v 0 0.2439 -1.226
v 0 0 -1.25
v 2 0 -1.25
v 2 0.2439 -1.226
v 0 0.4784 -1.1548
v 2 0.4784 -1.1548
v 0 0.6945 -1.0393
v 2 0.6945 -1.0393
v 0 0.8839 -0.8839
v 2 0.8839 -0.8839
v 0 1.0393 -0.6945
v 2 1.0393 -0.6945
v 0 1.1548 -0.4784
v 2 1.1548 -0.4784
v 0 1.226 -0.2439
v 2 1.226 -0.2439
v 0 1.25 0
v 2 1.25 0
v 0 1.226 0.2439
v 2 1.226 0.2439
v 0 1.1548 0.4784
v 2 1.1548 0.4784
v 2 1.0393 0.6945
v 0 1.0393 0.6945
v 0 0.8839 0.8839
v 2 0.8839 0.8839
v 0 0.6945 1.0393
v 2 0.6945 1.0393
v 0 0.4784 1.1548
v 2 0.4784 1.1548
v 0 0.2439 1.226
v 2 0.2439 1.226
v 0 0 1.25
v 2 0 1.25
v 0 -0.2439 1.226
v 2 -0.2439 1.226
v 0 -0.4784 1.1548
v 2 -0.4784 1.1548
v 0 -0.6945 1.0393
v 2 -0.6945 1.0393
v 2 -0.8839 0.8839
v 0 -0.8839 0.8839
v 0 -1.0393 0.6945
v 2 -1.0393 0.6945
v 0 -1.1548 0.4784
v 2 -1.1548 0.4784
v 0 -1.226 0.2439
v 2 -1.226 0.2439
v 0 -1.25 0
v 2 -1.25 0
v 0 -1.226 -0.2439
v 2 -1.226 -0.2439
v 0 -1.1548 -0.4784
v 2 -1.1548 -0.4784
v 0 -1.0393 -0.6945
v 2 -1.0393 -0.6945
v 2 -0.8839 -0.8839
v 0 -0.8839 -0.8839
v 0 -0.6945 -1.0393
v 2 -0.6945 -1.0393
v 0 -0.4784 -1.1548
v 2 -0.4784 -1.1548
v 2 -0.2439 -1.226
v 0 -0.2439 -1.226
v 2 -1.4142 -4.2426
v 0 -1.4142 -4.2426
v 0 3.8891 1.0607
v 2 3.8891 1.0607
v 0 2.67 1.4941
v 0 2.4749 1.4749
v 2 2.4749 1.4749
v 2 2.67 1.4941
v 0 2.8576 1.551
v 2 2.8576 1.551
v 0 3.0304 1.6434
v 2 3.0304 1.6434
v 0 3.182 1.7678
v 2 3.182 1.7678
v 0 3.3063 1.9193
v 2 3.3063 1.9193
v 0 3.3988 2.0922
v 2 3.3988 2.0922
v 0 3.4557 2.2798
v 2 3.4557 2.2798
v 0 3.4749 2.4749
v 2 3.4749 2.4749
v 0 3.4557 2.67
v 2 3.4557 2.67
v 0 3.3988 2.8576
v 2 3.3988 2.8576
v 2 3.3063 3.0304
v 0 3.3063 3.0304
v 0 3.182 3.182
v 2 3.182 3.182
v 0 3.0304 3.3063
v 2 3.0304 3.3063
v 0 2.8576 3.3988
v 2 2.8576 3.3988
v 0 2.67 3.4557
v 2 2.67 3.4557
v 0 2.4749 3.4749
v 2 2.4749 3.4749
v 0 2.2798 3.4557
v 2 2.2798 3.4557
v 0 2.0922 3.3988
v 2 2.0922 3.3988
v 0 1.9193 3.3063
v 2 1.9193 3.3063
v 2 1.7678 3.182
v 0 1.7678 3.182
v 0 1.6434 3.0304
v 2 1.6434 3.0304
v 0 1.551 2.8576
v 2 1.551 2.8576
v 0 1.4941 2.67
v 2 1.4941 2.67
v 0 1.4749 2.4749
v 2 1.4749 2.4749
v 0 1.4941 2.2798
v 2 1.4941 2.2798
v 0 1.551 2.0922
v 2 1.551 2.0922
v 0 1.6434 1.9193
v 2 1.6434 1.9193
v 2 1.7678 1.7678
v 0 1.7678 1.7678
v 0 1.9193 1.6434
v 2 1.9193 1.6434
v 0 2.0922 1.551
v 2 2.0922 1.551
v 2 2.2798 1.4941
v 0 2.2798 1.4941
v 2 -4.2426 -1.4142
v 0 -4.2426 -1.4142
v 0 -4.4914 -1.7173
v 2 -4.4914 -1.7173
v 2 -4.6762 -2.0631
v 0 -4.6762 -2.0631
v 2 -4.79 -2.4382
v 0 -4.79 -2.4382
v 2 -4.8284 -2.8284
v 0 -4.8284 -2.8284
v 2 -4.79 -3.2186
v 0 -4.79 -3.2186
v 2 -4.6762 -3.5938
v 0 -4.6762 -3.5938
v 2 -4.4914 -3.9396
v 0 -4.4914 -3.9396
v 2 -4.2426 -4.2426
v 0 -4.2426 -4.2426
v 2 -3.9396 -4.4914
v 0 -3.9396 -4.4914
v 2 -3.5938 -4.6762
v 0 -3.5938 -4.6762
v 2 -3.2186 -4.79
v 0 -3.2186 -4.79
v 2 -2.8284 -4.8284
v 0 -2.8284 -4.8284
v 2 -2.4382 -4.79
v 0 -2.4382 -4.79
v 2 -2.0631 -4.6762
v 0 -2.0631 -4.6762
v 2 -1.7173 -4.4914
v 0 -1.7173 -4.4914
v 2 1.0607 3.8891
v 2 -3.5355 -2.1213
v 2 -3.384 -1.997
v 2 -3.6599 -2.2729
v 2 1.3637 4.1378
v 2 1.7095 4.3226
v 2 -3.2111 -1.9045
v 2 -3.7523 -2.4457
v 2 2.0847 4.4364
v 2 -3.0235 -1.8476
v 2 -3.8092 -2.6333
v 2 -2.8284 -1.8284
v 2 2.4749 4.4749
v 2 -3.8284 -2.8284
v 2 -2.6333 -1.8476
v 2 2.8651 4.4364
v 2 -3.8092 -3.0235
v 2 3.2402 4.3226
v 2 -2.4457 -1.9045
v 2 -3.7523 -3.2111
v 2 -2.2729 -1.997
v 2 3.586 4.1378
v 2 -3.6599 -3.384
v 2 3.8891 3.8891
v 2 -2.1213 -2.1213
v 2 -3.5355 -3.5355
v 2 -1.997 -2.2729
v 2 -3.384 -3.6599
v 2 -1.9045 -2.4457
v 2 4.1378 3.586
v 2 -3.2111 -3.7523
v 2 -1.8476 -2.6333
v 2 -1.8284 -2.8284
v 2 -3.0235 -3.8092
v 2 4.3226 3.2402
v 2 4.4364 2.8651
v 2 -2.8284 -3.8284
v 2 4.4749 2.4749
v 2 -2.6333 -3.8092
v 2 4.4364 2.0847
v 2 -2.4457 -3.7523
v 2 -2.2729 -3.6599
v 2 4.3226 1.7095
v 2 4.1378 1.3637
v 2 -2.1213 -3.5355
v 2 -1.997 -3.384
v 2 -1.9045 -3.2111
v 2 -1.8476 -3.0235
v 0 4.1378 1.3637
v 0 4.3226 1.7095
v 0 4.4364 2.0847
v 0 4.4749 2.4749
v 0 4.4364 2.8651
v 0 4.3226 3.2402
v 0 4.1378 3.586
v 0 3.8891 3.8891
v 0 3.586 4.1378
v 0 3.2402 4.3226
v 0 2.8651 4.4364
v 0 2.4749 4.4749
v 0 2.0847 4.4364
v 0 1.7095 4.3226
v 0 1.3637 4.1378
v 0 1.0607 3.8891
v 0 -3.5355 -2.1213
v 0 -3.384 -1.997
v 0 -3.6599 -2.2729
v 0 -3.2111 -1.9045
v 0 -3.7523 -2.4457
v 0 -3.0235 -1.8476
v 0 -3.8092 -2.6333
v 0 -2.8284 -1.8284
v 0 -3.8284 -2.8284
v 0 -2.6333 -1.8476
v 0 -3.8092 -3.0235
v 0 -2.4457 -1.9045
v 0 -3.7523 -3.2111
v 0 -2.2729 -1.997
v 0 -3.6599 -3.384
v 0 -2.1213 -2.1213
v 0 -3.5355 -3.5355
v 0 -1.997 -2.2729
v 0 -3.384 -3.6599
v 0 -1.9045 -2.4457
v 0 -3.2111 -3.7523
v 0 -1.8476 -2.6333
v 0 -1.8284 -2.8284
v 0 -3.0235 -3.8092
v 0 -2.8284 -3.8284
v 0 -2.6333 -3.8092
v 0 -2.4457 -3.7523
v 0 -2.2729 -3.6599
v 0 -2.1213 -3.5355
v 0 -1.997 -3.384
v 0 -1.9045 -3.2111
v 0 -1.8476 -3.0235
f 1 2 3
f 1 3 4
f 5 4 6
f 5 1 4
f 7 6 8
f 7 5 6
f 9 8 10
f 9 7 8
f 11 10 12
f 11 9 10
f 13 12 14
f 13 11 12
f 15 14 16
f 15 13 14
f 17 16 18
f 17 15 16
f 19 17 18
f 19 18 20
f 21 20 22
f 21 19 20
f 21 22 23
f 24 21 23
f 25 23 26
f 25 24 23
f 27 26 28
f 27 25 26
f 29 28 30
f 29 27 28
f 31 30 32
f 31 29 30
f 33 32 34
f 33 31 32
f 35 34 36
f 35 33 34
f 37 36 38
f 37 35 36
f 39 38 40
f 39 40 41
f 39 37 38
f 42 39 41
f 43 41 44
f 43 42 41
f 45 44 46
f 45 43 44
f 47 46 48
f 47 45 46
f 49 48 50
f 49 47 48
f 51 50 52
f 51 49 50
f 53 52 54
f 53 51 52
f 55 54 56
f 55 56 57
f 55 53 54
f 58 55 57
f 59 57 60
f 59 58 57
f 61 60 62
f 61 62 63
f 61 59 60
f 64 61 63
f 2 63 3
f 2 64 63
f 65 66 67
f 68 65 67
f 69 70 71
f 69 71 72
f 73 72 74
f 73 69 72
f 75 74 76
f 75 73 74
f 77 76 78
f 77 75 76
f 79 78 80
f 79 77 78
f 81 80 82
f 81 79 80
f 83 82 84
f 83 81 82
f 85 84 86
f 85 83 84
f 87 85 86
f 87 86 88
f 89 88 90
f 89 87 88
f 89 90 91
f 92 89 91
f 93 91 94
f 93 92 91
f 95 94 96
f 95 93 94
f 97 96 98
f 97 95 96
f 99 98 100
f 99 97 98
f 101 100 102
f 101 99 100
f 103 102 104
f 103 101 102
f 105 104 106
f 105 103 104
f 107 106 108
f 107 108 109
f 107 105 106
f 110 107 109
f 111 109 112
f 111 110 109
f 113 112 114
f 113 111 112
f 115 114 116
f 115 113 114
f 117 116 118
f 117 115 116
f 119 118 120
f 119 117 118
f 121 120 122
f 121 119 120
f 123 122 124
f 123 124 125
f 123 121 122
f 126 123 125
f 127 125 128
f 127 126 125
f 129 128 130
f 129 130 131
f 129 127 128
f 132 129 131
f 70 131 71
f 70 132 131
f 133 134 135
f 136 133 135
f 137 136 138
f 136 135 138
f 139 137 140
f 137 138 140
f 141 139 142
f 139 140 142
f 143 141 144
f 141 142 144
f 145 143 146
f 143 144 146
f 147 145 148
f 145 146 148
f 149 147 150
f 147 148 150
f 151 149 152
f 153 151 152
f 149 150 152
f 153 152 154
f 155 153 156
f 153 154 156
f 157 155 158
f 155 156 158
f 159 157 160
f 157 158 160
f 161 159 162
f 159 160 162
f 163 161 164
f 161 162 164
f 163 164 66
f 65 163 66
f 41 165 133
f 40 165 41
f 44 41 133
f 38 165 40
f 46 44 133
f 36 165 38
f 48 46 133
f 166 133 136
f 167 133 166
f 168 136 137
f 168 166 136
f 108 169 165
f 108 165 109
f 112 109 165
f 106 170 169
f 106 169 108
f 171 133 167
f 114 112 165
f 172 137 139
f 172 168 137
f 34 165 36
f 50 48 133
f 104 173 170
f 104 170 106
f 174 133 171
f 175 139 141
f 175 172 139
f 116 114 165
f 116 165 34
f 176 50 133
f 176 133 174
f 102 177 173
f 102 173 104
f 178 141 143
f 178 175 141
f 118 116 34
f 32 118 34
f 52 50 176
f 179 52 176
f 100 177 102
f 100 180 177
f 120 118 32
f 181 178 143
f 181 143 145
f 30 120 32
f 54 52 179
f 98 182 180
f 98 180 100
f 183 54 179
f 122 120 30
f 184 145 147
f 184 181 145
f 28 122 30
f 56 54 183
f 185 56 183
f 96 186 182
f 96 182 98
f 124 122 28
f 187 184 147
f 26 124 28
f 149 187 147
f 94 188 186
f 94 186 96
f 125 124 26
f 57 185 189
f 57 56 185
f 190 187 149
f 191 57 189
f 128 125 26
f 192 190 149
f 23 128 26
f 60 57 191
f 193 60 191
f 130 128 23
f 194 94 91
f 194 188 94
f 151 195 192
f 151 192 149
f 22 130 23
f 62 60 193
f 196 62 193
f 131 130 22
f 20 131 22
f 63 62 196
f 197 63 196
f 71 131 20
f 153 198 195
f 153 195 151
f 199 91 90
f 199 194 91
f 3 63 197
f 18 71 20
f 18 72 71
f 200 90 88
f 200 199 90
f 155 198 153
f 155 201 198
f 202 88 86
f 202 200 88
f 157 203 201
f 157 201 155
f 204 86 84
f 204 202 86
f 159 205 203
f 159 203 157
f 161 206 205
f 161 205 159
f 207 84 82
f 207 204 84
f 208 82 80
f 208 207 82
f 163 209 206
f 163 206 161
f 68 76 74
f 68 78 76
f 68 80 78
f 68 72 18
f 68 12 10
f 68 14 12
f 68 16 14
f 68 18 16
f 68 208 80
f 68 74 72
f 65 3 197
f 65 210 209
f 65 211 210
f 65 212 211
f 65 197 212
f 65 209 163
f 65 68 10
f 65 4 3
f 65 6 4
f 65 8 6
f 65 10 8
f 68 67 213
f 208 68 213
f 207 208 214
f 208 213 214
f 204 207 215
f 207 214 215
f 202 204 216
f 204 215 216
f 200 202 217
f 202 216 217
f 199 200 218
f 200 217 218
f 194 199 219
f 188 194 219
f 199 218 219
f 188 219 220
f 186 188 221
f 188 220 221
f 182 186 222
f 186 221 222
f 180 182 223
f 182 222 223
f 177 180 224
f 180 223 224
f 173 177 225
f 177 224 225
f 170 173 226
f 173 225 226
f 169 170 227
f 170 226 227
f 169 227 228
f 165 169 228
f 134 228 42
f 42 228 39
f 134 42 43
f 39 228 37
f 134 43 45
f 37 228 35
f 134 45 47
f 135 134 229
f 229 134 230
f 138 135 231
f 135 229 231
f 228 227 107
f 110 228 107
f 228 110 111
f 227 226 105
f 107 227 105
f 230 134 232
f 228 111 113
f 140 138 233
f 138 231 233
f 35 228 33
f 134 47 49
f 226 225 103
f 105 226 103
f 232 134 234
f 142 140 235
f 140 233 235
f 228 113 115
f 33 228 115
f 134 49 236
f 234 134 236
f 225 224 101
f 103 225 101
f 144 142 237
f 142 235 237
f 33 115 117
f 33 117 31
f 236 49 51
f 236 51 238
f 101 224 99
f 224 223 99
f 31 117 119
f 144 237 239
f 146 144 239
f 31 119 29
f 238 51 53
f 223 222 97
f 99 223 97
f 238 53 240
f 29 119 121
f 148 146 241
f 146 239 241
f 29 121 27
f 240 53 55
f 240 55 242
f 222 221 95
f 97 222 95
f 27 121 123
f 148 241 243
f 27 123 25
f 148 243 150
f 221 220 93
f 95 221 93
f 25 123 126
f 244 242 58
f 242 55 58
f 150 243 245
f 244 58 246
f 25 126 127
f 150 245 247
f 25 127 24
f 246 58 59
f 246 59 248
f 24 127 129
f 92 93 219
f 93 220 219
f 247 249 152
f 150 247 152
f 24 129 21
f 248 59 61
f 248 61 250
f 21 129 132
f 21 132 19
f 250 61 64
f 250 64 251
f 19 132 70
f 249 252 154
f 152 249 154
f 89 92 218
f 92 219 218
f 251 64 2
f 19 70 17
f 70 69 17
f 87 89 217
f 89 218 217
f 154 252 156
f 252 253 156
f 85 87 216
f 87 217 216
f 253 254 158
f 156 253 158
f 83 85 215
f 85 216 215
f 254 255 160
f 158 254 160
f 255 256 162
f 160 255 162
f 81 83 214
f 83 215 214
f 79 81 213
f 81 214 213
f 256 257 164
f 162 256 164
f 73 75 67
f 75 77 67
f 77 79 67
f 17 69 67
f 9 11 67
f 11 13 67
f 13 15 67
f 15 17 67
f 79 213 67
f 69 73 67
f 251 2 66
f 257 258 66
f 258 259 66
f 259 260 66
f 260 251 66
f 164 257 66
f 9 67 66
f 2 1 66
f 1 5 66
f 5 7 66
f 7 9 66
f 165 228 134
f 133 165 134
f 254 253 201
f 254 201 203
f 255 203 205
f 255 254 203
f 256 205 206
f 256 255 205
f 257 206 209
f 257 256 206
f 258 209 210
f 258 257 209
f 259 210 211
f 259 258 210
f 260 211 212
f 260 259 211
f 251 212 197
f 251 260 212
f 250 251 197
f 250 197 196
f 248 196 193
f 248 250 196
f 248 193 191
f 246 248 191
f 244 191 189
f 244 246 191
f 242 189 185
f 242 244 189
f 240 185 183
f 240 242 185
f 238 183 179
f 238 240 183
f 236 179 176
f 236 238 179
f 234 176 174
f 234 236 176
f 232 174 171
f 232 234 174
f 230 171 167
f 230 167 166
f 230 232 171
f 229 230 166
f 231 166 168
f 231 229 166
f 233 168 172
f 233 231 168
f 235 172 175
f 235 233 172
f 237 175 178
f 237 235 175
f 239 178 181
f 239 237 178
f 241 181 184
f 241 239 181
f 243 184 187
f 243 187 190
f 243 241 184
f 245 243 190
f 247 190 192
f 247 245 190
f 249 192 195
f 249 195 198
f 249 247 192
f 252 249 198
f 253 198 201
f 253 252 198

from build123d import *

# Parameters (mm, degrees)
SKETCH1_R           = 1
SKETCH1_R_2         = 1.25
BOSS_EXTRUDE1_DEPTH = 2


with BuildPart() as part:
    # Sketch1 → Boss-Extrude1 (new body)
    with BuildSketch(Plane(origin=(0, 0, 0), x_dir=(0, 0, -1), z_dir=(1, 0, 0))):
        with BuildLine():
            ThreePointArc((-1.060660172, 3.889087297), (-3.889087297, 3.889087297), (-3.889087297, 1.060660172))
            Line((-3.889087297, 1.060660172), (1.414213562, -4.242640687))
            ThreePointArc((1.414213562, -4.242640687), (4.242640687, -4.242640687), (4.242640687, -1.414213562))
            Line((4.242640687, -1.414213562), (-1.060660172, 3.889087297))
        make_face()
        with Locations((2.828427125, -2.828427125)):
            Circle(SKETCH1_R, mode=Mode.SUBTRACT)
        Circle(SKETCH1_R_2, mode=Mode.SUBTRACT)
        with Locations((-2.474873734, 2.474873734)):
            Circle(SKETCH1_R, mode=Mode.SUBTRACT)
    extrude(amount=BOSS_EXTRUDE1_DEPTH)


solid = part.part
